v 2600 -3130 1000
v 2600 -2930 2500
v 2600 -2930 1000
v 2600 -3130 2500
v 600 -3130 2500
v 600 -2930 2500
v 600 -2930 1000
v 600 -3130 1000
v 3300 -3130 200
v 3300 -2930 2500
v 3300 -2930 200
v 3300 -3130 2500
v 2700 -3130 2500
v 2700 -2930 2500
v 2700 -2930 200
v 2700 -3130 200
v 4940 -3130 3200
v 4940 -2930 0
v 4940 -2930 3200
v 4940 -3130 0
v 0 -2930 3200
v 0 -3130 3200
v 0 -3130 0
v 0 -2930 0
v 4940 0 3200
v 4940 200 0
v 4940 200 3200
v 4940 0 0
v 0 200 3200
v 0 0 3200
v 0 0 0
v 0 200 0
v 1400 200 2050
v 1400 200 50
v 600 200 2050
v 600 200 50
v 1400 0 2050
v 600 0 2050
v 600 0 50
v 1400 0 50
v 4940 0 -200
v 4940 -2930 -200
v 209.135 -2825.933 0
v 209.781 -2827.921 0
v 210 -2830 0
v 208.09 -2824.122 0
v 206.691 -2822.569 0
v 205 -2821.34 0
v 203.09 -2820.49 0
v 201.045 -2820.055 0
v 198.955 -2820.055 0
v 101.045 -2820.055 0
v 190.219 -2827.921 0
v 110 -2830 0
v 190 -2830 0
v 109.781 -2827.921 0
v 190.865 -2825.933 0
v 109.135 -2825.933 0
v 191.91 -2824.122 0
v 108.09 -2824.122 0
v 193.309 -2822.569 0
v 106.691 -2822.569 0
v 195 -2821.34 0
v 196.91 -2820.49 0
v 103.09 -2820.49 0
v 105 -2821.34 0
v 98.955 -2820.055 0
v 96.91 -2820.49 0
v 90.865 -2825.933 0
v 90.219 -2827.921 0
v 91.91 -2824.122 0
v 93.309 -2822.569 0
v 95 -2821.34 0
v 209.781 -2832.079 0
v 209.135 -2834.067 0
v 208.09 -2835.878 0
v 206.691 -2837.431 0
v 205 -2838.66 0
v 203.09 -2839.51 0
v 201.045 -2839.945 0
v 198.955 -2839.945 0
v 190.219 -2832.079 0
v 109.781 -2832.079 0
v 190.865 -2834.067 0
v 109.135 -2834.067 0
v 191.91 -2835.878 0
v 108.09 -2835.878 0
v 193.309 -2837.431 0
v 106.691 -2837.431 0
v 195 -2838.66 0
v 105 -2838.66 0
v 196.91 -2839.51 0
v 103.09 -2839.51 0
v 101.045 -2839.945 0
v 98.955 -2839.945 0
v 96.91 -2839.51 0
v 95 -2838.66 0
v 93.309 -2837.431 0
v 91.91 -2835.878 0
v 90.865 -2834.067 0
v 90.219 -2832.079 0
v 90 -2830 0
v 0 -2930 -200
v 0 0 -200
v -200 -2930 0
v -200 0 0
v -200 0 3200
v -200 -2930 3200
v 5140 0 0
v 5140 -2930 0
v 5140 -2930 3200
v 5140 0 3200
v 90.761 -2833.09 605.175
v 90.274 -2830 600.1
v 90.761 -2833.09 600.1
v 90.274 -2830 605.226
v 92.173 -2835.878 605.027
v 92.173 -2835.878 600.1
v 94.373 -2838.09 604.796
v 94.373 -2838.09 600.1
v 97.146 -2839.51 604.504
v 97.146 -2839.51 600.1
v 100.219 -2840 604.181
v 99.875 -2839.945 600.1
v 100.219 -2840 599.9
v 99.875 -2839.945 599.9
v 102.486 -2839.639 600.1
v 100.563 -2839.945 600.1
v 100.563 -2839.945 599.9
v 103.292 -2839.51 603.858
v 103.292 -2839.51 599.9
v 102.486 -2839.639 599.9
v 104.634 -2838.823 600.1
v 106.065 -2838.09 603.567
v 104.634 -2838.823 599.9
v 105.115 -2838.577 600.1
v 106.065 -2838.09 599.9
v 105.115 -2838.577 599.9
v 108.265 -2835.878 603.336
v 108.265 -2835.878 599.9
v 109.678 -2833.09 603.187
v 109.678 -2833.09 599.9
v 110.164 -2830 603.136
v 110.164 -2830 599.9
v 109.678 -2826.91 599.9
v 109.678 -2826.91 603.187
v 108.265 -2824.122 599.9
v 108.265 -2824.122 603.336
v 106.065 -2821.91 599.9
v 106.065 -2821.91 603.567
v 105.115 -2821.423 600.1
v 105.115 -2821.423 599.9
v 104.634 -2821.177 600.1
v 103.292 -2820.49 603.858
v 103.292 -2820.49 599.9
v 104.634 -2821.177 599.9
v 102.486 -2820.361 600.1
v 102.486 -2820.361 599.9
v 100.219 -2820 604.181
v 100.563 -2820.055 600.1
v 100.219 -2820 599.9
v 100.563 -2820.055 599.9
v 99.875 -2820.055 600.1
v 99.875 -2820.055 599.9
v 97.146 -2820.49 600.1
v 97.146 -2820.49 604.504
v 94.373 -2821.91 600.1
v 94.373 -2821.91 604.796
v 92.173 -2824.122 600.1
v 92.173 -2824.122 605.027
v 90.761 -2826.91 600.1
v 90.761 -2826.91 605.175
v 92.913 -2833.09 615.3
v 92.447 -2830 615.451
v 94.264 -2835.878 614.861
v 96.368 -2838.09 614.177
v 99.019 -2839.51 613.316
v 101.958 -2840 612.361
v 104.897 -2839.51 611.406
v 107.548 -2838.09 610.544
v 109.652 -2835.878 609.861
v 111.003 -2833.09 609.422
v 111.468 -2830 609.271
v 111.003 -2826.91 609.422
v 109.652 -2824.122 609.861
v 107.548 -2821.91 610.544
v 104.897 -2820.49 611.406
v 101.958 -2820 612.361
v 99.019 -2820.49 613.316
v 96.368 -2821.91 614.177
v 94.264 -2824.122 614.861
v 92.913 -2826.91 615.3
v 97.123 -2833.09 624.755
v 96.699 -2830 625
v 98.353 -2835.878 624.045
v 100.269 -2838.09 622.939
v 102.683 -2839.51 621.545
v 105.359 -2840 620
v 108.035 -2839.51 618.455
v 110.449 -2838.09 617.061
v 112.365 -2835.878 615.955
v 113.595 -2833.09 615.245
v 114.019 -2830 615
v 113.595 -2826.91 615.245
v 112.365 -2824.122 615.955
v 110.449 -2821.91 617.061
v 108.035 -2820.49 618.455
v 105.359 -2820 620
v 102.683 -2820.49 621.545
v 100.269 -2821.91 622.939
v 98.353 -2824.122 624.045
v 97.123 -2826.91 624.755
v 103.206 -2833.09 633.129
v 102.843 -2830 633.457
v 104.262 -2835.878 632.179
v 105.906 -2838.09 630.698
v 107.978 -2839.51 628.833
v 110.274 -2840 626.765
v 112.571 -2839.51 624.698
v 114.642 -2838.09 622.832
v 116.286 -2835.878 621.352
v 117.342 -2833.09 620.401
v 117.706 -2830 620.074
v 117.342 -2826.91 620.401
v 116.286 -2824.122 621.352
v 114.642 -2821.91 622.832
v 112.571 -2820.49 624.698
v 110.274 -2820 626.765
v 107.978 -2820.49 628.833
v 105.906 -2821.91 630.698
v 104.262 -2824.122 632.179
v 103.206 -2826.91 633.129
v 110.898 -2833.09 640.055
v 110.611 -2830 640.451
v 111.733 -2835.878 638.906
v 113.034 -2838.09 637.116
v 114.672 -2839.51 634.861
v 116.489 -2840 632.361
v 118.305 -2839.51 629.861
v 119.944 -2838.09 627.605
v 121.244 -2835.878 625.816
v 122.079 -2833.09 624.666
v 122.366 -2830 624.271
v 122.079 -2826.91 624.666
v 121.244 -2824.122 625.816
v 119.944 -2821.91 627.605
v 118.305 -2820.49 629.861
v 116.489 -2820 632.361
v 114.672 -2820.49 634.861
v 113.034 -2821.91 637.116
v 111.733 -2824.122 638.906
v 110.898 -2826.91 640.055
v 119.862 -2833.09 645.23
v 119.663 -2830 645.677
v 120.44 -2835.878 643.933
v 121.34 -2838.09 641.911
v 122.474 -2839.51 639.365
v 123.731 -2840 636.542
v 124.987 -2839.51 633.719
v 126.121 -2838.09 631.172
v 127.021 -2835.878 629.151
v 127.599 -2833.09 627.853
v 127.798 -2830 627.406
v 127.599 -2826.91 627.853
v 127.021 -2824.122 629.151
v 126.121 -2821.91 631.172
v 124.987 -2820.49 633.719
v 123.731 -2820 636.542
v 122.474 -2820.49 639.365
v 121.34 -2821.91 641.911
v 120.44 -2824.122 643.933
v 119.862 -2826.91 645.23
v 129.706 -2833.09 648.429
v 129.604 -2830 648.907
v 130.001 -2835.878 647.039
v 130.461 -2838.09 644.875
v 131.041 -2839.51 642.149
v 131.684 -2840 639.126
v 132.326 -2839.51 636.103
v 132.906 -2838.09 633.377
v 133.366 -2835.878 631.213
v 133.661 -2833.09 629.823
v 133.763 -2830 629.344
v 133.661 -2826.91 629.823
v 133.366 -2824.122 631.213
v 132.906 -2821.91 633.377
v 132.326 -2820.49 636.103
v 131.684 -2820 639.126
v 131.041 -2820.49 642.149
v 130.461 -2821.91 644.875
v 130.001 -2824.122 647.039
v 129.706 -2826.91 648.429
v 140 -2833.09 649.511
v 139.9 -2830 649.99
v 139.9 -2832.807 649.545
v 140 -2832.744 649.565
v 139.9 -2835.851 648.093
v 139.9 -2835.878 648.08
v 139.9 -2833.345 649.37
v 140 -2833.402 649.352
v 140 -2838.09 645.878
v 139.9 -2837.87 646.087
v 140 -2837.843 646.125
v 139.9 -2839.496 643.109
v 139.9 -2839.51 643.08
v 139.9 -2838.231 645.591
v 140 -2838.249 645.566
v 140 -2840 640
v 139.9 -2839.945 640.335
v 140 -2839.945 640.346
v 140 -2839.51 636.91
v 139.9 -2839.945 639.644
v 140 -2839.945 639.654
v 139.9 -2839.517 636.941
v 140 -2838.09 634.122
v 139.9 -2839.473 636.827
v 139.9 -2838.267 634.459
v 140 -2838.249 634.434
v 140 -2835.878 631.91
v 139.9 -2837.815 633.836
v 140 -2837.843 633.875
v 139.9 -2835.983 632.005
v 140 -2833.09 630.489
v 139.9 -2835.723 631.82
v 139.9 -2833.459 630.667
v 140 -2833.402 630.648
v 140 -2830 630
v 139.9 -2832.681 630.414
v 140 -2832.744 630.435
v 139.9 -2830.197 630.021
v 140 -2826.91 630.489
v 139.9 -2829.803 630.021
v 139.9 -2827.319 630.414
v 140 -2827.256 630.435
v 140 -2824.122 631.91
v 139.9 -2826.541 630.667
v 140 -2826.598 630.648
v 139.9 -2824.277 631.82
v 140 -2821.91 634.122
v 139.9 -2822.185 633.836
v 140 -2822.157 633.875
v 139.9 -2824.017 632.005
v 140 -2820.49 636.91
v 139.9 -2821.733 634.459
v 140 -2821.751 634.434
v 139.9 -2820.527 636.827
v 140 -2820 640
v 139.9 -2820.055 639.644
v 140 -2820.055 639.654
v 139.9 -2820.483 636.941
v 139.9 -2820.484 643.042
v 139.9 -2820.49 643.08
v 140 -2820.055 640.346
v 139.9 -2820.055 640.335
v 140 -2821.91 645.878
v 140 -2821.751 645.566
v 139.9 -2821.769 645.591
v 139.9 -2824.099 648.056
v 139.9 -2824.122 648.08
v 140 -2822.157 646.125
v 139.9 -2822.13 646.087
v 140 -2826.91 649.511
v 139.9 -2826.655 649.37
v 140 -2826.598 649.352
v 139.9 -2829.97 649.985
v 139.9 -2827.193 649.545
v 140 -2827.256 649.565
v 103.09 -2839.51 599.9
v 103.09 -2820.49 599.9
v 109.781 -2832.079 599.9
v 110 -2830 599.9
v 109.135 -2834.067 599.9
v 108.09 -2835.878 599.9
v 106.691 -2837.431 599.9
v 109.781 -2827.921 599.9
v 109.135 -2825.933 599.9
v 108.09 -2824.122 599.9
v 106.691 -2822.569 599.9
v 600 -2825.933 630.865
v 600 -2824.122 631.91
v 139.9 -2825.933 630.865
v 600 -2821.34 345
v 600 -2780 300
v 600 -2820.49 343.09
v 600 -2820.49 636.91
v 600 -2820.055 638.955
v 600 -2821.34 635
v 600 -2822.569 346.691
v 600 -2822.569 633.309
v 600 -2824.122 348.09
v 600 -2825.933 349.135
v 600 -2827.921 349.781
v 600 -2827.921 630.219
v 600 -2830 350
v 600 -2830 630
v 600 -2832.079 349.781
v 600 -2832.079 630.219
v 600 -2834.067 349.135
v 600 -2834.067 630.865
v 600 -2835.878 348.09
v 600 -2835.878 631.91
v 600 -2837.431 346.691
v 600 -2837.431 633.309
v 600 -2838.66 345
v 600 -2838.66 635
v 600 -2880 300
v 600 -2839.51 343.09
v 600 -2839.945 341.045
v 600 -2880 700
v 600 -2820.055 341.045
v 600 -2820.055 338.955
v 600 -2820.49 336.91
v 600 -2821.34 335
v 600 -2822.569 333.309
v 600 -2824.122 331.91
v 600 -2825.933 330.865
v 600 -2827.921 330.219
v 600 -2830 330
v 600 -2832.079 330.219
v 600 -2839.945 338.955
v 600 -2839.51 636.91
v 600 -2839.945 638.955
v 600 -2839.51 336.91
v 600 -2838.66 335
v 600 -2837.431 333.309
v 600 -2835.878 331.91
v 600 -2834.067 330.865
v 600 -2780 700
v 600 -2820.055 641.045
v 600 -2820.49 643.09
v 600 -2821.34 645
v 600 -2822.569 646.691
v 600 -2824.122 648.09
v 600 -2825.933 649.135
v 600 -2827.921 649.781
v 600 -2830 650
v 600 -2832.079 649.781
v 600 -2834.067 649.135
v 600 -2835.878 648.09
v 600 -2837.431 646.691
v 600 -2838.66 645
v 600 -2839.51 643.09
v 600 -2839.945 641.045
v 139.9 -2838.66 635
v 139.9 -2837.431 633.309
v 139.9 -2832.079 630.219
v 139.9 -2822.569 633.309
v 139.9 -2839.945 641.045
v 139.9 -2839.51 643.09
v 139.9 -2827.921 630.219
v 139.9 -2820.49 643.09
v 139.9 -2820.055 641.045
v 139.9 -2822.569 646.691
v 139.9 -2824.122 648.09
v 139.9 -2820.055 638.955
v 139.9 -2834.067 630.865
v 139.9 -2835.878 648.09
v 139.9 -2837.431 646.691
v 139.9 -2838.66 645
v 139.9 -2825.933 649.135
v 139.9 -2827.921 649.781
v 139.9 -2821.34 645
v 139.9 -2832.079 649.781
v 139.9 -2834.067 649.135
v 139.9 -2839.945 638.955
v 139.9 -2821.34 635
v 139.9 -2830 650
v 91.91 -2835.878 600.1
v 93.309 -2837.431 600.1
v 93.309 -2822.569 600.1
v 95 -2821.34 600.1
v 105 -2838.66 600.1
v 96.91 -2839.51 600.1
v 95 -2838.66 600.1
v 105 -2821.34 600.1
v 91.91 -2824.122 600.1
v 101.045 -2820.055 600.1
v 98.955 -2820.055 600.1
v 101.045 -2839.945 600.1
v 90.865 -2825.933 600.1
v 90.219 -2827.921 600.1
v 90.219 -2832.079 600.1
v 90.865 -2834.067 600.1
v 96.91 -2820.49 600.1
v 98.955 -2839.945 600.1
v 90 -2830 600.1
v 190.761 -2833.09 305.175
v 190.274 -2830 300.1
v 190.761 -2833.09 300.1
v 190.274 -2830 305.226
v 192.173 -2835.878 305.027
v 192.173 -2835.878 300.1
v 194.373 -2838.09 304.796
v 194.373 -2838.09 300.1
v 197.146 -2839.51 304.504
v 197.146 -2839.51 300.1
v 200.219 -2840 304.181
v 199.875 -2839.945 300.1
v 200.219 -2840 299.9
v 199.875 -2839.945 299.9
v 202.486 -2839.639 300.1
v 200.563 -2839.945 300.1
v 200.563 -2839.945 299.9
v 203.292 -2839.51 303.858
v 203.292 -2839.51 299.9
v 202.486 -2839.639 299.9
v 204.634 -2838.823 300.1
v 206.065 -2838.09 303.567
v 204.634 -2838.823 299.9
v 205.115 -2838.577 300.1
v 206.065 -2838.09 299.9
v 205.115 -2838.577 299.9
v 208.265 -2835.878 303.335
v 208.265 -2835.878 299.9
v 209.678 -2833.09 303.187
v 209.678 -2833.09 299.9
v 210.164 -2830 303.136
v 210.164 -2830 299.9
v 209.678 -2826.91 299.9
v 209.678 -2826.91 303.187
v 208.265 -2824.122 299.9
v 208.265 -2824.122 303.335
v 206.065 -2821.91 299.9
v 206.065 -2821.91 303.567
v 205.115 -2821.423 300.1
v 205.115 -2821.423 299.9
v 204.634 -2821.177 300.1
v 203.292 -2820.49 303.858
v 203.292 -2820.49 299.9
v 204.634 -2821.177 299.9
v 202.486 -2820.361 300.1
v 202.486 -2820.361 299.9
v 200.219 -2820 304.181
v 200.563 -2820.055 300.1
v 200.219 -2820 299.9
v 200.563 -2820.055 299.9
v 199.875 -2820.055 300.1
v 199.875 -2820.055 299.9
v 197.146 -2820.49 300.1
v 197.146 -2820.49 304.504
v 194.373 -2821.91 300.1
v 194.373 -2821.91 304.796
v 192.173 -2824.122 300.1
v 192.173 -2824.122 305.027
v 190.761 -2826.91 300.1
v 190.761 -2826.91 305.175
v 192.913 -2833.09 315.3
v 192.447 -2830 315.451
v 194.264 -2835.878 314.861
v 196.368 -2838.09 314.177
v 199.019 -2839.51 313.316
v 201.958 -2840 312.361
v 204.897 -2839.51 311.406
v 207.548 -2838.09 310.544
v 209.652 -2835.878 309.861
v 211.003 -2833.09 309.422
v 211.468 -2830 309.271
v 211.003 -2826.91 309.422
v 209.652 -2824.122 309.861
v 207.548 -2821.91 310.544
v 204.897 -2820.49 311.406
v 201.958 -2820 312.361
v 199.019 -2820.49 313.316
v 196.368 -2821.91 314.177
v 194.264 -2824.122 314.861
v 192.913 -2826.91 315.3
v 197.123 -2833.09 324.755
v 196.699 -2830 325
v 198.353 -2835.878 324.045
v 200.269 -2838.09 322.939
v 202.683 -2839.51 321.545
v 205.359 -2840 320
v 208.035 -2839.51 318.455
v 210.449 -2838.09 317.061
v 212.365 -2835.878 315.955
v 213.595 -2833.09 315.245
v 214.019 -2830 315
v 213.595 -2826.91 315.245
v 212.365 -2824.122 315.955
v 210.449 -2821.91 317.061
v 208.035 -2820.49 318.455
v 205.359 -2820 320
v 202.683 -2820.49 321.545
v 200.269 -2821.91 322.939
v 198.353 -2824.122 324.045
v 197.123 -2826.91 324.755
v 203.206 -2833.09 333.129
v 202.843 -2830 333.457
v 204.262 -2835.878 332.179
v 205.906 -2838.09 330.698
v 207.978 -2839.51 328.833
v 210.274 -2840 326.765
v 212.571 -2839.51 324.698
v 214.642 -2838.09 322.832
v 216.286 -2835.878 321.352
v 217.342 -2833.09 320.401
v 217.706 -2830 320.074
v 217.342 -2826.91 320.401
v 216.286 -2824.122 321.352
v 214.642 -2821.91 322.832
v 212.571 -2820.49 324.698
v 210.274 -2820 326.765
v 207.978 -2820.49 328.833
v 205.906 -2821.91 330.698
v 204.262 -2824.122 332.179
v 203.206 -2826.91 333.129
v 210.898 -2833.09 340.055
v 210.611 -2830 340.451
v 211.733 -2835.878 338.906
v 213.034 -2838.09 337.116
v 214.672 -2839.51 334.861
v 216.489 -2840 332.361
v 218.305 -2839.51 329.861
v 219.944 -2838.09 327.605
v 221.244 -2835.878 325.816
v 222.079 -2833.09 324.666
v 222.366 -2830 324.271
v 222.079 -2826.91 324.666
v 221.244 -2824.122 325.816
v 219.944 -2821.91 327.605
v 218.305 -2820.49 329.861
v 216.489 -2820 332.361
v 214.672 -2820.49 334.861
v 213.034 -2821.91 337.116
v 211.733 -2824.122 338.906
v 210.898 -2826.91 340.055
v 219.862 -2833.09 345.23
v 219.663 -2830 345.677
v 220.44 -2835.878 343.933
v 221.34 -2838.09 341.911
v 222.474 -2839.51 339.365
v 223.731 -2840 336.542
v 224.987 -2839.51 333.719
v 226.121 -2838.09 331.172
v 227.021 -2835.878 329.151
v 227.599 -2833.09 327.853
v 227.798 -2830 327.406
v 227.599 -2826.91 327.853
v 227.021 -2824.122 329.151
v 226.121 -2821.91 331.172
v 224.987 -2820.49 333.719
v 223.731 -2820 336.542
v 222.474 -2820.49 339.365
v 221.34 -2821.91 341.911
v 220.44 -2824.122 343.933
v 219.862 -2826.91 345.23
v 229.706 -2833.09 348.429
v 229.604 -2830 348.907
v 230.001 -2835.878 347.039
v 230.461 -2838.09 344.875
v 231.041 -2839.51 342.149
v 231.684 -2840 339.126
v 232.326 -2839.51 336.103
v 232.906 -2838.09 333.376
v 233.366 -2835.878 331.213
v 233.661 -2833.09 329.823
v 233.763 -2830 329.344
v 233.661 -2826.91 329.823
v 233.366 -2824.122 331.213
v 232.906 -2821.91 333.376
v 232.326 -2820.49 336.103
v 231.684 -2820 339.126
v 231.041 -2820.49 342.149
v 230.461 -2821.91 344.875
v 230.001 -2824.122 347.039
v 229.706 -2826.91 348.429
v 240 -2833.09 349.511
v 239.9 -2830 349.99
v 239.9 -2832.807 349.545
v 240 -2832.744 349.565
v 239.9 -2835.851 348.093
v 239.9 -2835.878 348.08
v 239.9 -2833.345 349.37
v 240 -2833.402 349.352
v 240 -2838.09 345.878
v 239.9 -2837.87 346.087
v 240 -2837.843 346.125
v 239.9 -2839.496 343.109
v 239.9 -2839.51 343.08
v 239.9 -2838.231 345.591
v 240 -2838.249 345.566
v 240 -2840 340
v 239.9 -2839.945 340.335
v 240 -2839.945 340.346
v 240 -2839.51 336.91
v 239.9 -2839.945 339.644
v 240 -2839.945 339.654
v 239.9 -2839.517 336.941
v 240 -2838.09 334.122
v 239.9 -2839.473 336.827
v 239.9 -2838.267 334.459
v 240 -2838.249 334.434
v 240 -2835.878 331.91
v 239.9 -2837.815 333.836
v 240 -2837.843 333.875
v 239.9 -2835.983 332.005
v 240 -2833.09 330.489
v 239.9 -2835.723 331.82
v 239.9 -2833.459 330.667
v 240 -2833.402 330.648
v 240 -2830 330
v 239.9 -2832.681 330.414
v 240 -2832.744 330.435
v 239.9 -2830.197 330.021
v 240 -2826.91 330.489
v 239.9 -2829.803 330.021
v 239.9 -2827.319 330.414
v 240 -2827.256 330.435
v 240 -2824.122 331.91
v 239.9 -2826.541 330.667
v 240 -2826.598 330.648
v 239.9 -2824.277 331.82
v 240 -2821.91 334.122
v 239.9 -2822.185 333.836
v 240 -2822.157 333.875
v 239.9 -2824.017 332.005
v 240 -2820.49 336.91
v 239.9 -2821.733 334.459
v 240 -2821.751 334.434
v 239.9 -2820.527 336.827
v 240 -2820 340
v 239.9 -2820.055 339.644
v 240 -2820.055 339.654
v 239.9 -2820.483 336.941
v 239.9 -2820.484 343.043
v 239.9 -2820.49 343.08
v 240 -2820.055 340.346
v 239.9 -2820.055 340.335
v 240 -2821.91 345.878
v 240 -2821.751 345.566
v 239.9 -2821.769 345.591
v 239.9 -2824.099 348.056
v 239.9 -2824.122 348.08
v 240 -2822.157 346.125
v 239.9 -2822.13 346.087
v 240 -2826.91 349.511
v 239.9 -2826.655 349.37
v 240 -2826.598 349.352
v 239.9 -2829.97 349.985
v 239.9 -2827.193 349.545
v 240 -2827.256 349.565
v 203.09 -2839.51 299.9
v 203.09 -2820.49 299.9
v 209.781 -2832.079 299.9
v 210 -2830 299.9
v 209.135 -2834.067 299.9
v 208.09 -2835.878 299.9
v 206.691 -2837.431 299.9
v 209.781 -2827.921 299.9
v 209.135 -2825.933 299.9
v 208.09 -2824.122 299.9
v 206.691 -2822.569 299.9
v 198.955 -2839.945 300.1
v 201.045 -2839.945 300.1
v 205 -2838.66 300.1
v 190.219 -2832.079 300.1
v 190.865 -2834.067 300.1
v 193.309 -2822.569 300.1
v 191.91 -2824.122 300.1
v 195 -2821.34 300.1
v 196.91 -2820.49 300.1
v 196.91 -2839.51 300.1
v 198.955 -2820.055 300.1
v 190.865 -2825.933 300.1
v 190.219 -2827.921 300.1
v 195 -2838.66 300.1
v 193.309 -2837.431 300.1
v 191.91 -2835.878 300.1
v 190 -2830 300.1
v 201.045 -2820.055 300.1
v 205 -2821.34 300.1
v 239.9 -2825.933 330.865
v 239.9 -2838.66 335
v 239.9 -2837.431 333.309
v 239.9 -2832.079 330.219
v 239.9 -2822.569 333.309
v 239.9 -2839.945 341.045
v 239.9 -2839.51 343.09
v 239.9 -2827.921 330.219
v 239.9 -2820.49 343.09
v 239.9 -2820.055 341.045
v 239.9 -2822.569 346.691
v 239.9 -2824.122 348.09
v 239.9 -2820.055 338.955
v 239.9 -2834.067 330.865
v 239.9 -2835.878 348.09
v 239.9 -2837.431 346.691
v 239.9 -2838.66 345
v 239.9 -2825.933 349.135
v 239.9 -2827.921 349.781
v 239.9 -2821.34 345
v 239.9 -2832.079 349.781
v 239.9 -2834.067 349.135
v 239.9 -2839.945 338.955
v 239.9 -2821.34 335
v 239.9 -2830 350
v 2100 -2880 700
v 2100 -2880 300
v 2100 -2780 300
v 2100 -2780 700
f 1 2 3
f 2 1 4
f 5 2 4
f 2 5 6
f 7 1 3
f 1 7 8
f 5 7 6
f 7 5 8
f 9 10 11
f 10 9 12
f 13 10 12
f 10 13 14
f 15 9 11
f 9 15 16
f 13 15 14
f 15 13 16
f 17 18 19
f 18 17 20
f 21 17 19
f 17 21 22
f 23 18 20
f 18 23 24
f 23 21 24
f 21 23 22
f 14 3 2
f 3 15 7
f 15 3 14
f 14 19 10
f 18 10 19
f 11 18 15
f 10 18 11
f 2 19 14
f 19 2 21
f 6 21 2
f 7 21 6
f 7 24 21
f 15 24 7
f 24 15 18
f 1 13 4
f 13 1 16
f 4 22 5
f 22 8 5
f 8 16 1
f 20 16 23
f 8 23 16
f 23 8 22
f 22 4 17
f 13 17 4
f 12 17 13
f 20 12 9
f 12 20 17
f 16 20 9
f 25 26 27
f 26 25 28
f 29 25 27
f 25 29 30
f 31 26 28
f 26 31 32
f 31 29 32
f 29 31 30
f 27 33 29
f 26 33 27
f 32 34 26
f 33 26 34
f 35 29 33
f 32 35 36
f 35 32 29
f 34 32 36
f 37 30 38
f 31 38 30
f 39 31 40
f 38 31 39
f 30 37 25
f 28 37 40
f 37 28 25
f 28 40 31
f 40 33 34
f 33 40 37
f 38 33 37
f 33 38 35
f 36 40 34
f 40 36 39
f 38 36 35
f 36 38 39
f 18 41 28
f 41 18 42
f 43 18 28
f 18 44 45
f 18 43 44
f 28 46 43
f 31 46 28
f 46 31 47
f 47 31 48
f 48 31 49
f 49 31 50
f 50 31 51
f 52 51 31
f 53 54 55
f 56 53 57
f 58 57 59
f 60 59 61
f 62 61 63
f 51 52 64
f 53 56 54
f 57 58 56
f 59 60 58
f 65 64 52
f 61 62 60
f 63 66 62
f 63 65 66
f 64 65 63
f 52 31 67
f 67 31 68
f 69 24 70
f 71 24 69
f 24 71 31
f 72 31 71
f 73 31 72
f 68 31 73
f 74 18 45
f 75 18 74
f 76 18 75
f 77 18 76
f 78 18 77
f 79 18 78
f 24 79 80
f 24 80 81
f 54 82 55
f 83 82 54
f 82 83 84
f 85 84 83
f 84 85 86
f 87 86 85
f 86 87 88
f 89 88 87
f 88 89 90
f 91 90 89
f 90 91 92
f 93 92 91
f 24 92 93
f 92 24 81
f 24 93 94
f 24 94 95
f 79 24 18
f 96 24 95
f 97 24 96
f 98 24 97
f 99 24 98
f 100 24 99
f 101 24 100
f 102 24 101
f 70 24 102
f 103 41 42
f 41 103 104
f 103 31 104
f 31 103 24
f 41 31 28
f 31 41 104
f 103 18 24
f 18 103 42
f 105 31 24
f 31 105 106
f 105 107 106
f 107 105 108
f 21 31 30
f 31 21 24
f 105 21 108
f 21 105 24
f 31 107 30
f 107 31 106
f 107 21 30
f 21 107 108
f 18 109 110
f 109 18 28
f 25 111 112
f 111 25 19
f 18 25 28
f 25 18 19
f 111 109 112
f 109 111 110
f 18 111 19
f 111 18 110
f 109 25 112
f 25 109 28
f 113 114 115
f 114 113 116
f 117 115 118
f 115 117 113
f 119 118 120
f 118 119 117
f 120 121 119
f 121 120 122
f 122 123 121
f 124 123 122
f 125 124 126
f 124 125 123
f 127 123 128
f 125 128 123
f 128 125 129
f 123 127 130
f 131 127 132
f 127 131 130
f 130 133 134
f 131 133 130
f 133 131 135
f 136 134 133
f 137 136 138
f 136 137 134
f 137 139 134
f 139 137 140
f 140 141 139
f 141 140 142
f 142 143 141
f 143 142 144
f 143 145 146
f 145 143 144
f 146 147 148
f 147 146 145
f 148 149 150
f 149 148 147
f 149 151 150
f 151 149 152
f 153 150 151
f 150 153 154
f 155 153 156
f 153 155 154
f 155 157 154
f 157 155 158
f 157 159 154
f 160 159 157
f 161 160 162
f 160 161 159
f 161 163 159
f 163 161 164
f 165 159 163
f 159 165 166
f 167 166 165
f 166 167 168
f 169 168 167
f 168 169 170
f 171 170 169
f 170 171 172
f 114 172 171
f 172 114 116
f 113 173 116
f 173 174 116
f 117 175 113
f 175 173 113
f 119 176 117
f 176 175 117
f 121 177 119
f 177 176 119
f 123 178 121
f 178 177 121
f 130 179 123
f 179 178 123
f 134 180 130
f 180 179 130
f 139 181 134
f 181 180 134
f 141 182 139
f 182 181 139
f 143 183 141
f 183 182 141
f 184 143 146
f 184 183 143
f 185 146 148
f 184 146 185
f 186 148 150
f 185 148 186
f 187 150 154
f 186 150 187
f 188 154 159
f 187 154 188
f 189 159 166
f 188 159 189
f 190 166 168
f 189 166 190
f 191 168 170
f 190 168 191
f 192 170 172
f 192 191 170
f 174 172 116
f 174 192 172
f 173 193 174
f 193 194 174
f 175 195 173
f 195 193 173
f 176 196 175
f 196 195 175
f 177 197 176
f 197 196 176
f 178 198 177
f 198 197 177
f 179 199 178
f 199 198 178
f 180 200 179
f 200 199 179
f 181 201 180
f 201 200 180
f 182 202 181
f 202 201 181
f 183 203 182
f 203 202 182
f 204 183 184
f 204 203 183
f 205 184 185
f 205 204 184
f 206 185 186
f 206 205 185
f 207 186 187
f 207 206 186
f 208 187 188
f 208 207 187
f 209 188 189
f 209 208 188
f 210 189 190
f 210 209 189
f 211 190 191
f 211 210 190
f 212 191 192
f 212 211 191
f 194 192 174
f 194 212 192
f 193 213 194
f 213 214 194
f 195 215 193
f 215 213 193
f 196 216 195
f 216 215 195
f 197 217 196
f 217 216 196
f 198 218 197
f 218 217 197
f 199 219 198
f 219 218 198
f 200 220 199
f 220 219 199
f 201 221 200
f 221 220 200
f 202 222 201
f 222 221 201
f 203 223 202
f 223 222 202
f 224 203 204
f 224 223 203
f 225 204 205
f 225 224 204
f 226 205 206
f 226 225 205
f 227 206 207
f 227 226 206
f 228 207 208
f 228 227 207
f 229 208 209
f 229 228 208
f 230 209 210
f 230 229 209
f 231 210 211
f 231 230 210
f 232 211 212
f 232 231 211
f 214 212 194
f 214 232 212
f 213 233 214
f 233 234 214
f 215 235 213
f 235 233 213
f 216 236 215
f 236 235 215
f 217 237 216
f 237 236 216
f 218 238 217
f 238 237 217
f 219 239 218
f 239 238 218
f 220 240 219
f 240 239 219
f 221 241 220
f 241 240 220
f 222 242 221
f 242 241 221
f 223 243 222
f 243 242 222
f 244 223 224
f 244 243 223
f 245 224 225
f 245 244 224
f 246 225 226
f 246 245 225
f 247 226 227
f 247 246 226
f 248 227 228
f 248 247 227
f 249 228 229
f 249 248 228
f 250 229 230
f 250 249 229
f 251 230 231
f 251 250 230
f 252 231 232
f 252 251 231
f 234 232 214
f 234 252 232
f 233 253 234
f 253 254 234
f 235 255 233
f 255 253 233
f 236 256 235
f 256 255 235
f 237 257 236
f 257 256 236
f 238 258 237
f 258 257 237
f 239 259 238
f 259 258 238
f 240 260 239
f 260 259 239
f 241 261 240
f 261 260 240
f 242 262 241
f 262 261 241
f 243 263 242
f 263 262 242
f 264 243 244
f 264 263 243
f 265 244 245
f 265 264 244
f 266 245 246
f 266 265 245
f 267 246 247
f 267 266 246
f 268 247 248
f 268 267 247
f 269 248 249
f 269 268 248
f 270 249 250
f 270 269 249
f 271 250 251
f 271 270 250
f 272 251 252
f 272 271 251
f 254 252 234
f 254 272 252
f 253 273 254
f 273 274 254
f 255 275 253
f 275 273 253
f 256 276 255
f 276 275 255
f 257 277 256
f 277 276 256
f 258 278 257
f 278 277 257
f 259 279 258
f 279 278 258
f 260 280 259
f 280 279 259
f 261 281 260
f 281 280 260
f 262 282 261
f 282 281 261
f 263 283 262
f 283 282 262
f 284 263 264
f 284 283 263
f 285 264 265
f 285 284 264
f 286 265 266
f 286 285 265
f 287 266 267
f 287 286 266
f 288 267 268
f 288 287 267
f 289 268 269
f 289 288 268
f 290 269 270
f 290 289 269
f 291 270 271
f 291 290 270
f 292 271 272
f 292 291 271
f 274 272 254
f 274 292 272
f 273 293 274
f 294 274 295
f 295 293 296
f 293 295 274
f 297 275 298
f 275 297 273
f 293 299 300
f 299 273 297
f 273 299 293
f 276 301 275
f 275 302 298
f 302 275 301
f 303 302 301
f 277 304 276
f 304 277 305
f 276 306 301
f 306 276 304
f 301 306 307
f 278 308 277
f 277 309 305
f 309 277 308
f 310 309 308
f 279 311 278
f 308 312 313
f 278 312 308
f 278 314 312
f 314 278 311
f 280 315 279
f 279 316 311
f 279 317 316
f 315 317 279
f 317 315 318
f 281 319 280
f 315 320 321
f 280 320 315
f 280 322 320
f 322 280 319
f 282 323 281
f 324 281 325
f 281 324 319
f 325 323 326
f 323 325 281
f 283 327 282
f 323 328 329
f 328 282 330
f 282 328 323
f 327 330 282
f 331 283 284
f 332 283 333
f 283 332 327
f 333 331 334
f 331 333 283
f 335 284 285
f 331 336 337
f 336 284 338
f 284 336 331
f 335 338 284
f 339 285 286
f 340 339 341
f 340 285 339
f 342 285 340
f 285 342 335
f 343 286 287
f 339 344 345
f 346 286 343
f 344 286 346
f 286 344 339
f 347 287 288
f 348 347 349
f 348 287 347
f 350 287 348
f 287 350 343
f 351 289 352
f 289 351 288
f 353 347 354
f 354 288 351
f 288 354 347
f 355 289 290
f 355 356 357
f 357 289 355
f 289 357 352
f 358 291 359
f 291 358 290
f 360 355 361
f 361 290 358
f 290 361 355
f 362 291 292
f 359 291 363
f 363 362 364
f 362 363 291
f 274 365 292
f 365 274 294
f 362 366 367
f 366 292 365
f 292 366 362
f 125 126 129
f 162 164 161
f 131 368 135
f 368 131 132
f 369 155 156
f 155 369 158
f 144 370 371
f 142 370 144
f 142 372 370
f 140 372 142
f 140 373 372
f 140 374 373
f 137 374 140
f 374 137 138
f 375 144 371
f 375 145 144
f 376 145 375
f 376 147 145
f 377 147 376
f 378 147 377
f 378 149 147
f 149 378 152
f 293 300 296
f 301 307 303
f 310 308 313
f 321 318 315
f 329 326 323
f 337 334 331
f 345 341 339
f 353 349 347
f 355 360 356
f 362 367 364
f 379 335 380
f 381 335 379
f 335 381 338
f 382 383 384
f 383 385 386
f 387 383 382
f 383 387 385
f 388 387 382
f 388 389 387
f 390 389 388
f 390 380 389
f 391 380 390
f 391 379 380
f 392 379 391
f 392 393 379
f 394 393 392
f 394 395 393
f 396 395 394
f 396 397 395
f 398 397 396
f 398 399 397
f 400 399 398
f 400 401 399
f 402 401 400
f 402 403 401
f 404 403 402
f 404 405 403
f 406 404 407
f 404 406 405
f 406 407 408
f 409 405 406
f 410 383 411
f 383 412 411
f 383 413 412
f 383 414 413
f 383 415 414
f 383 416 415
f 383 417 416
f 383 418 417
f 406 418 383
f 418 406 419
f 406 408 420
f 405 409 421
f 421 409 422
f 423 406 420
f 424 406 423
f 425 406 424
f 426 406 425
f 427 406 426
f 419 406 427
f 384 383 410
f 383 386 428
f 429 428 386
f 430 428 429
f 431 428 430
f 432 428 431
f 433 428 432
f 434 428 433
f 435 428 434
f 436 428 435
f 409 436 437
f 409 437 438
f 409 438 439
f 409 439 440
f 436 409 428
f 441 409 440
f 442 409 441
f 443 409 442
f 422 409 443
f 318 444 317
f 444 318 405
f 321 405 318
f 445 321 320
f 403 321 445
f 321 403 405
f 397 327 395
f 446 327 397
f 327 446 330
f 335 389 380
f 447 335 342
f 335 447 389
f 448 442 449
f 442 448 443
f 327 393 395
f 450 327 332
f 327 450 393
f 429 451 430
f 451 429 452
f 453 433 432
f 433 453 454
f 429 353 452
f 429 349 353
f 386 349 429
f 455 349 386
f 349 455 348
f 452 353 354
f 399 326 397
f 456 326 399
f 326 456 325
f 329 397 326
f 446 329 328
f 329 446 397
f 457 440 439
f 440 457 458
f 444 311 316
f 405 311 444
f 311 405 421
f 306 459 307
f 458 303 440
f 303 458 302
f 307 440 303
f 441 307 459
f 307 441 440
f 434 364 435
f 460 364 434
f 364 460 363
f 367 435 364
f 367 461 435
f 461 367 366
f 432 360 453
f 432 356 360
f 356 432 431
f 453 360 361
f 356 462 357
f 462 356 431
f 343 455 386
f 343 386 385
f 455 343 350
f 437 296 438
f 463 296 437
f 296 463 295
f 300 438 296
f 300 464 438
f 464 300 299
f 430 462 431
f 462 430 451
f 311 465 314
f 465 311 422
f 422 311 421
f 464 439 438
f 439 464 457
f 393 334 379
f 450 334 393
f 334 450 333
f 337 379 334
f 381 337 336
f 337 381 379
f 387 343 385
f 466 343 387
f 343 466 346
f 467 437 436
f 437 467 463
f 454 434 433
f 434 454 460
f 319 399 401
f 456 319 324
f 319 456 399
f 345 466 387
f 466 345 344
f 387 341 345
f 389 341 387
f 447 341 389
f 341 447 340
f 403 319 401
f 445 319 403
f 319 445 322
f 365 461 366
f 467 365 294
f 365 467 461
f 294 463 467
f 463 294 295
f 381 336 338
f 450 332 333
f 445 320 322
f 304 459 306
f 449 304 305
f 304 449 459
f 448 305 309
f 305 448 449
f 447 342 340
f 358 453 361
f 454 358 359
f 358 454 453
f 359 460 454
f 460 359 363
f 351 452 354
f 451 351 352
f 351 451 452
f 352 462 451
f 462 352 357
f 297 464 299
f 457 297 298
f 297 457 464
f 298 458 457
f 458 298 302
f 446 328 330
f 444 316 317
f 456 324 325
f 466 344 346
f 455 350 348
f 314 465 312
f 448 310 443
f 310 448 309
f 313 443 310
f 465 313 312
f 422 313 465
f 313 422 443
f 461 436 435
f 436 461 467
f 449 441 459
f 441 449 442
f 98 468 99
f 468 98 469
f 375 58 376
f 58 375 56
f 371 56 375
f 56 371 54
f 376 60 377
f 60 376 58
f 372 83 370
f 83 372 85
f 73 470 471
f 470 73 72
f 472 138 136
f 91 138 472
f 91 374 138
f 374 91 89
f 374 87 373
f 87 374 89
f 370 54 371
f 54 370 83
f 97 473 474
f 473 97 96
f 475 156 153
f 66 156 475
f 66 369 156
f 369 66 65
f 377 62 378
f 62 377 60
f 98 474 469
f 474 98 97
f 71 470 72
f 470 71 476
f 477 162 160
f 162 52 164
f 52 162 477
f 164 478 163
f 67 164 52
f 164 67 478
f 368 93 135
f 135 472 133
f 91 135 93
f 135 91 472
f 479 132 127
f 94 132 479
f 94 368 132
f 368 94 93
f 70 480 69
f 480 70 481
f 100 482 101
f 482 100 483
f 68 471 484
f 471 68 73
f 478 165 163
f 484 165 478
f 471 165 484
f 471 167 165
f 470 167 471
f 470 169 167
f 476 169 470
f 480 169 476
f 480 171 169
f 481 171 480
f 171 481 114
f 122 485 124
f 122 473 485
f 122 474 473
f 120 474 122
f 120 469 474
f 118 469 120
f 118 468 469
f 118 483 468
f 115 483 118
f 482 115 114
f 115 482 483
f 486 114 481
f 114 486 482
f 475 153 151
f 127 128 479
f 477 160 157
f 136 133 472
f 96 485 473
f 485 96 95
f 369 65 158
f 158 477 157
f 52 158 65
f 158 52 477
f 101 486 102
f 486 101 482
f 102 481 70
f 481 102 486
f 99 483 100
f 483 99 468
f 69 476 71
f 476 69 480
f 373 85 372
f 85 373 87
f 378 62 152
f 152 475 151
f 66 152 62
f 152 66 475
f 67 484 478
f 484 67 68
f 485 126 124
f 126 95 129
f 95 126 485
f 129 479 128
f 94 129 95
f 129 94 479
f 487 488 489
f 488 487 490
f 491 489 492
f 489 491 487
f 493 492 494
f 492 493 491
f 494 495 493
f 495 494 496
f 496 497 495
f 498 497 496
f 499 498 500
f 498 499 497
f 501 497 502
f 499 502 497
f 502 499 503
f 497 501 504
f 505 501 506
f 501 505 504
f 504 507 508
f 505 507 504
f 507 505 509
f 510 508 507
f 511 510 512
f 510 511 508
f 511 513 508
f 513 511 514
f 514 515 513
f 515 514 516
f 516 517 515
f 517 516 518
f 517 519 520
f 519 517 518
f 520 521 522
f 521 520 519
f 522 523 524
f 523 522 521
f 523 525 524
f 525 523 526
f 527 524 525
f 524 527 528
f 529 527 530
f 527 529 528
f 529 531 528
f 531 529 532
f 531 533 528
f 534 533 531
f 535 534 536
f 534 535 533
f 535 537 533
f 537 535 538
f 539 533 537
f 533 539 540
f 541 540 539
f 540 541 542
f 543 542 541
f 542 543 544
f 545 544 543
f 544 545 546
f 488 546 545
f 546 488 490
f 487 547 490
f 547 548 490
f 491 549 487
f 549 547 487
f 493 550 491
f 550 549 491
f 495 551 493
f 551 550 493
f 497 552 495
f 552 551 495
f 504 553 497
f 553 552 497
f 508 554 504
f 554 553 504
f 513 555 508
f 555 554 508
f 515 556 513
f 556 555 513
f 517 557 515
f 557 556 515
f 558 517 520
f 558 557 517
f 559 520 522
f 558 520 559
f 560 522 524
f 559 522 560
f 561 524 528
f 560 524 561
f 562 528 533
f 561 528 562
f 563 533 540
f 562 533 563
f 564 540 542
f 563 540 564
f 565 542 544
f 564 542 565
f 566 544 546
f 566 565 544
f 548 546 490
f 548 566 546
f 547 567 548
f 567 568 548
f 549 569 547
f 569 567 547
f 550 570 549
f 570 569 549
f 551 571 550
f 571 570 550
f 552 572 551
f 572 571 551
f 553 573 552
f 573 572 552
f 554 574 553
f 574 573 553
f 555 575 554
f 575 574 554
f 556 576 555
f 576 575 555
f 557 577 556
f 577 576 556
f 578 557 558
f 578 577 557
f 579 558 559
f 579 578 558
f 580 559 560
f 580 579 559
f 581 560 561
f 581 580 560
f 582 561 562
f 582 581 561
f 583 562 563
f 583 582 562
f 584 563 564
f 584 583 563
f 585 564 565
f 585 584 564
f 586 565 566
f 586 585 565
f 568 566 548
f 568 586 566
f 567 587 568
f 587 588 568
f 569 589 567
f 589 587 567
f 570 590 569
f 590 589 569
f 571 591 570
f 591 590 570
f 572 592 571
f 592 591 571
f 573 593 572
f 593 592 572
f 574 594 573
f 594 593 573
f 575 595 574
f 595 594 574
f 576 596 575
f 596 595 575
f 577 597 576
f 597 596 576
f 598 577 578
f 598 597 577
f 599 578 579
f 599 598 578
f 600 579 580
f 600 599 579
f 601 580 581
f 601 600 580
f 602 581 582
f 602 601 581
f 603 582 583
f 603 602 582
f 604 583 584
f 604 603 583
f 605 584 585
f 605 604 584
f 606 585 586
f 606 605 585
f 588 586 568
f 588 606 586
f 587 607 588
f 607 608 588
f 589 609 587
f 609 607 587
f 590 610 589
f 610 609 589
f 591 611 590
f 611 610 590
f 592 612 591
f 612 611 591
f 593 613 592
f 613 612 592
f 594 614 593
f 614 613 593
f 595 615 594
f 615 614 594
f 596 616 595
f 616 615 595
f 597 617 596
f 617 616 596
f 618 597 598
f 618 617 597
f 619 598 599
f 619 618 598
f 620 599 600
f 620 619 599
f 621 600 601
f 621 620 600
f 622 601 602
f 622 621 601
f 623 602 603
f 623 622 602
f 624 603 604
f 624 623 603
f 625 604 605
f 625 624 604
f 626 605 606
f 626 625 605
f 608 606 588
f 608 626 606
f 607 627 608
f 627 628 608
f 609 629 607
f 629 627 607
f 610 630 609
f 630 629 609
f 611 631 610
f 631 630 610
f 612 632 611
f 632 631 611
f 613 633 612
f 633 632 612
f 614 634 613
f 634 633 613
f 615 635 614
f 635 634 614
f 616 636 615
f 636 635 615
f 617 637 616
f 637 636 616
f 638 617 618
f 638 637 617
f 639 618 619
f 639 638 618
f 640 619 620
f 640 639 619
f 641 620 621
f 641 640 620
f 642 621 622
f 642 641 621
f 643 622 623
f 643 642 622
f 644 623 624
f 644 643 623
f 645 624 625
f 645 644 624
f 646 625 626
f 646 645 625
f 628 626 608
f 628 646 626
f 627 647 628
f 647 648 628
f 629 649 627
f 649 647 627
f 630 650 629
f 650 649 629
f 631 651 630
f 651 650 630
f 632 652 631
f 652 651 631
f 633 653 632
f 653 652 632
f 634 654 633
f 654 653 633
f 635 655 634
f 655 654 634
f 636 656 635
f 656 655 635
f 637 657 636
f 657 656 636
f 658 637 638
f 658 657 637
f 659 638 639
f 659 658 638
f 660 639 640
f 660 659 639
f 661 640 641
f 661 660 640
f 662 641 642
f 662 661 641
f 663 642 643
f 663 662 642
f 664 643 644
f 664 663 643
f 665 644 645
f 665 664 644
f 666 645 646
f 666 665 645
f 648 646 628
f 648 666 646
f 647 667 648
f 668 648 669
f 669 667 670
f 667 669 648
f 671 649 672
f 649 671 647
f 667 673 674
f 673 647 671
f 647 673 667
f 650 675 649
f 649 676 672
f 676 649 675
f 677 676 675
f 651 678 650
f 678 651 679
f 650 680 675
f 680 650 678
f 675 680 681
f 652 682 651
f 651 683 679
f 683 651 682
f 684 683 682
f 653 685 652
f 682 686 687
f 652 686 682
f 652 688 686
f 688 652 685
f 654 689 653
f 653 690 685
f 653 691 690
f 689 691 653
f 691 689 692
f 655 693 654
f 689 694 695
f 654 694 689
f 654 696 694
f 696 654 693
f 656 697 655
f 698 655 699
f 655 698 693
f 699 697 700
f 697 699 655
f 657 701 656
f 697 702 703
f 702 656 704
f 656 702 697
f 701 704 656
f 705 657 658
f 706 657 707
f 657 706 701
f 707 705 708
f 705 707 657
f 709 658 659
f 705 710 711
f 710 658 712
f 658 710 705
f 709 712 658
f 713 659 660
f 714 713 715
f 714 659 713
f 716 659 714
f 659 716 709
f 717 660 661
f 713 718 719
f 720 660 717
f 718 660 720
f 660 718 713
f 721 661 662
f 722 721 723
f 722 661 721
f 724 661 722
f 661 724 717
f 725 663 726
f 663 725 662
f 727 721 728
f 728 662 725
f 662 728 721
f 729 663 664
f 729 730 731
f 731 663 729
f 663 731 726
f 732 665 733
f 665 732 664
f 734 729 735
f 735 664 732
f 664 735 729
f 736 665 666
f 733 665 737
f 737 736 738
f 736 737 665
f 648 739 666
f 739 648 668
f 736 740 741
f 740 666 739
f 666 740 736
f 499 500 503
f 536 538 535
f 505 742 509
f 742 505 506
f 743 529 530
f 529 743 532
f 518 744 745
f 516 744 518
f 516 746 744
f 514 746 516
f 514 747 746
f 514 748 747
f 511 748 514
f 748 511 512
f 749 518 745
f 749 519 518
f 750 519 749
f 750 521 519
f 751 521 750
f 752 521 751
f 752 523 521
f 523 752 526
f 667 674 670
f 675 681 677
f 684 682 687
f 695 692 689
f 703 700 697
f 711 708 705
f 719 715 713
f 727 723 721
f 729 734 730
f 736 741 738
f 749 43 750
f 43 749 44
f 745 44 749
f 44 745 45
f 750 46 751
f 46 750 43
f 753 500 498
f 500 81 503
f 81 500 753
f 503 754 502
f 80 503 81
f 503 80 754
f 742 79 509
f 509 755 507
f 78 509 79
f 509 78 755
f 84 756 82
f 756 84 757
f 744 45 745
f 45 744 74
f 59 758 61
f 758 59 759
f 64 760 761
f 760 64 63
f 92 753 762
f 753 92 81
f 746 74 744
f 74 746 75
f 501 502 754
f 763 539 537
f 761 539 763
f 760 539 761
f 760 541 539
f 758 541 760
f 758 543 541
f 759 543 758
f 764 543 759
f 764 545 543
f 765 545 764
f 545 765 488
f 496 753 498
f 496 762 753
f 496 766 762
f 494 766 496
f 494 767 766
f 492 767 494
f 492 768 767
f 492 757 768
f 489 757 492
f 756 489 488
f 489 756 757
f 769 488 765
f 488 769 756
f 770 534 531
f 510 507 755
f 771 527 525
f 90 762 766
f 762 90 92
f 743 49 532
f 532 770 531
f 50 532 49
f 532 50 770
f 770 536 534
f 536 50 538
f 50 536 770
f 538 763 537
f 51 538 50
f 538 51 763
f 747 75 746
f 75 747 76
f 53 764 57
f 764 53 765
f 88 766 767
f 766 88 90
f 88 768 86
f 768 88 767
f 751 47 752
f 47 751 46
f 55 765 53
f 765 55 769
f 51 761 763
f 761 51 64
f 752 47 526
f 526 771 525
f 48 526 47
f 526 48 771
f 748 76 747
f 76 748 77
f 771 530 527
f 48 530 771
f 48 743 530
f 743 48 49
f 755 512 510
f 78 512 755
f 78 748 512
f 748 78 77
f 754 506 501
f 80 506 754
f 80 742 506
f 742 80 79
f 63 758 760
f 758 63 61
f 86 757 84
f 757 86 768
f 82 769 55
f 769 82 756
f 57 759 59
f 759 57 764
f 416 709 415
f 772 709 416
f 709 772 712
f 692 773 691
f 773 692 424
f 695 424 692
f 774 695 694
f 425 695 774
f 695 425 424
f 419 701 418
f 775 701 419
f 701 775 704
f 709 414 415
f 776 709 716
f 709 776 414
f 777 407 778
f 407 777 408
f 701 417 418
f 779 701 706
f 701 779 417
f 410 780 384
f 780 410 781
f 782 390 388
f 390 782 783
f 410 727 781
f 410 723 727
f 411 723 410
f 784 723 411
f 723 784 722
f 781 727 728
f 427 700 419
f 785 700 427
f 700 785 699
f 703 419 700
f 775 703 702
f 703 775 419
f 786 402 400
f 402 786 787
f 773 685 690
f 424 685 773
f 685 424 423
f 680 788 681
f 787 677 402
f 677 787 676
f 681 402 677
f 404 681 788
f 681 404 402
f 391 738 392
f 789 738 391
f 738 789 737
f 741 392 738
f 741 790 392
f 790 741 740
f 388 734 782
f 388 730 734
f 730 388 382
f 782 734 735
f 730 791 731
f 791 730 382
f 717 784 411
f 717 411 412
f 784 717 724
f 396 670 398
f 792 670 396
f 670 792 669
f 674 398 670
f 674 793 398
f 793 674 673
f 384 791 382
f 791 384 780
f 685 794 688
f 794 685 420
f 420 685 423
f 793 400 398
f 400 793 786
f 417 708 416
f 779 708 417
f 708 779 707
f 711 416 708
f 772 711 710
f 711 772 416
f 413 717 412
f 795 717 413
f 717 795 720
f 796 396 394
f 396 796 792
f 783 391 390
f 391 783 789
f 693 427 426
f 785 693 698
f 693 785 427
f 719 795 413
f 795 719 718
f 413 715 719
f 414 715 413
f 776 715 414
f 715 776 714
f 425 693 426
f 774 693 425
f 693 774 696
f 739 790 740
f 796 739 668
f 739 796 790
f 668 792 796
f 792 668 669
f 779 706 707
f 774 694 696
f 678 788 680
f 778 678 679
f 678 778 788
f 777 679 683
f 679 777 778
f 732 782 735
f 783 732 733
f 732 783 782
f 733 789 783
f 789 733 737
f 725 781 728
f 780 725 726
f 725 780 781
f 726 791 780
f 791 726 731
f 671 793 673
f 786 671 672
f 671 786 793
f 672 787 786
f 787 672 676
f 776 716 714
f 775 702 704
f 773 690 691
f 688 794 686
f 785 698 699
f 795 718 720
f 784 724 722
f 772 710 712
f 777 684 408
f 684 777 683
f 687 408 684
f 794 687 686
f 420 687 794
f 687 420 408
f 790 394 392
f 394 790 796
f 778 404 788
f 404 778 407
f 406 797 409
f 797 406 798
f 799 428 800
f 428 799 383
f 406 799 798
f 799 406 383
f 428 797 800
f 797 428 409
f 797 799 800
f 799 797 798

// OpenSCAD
// file: serial_hull.scad
//serial_hull() {
//    cube(10, center=true);
//    translate([20,0,0]) sphere(10);
//    translate([30,0,0]) sphere(5);
//}


module serial_hull() {
    for(i=[0:$children-2]) {
        hull() {
            children(i);
            children(i+1);
        }
    }
}

module wedge(angle, extent=100, height=100, center=true) {
    module wedge_if(sub) {
        rotate([0,0,(angle > sub ? sub : angle)])
            translate([0,0,(center==true ? -height/2 : 0)])
                cube([extent,0.1,height]);
    }
    
    module wedge_wall() {
        for(r=[0:45:angle-1])
        rotate([0,0,r])
            translate([0,0,(center==true ? -height/2 : 0)])
                cube([extent,0.1,height]);
    }
    
    module convex_wedge(a) {
        translate([0,0,(center==true ? -height/2 : 0)])
            serial_hull() {
                for(r=[0:45:a-1])
                    rotate([0,0,r]) cube([extent,0.1,height]);
                rotate([0,0,a]) cube([extent,0.1,height]);
            }
    }
    
    if(angle<=180) {
        intersection() {
            for(i=[0:$children-1]) children(i);
            convex_wedge(angle);
        }
    } else {
        difference() {
            for(i=[0:$children-1]) children(i);
            scale([1,-1,1]) convex_wedge(360-angle);
        }
    }

//    serial_hull() {
//        wedge_if(0);
//        wedge_if(45*1);
//        wedge_if(45*2);
//        wedge_if(45*3);
//        wedge_if(45*4);
//        wedge_if(45*5);
//        wedge_if(45*6);
//        wedge_if(45*7);
//        wedge_if(45*8);
//    }
}

//difference() {
//    rotate_extrude() translate([40,0,0]) circle(r=30);
//    wedge(angle=247);
//}

wedge(angle=90)
    rotate_extrude(convexity=10) translate([40,0,0]) circle(r=30);
// file: bat.scad
// battery + pipe

use <./serial_hull.scad>

multi = 1000;

delta = 0.1;

bat_height = 0.4 * multi;
bat_length = 1.5 * multi;
bat_th = 0.1 * multi;

space_wall_bat = 0.6 * multi;
space_wall_pipe = 0.1 * multi;
space_floor_bat = 0.3 * multi;
space_pipes = 0.1 * multi;


pipe_length = 0.5 * multi;
pipe_height = space_floor_bat + 0.3 * multi;
pipe_height_low = space_floor_bat + 0.1 * multi;
pipe_d = 0.02 * multi;
pipe_2d = 2*pipe_d;



module battery() {
    translate([space_wall_bat,bat_th/2,space_floor_bat])
    rotate([90, 0, 0]) {
        color("white") cube([bat_length, bat_height, bat_th]);
    }
}

module round_pipe() {
    translate([pipe_d*2,0,0])
        rotate([0, -90, 90]) {
            wedge(angle=90, extent = pipe_d*3, height = pipe_d)
                rotate_extrude()
                    translate([pipe_2d,0,0]) circle(d=pipe_d, $fn=20);
        }
}

module pipe_top() {
    color("brown") union() {
        translate([0, 0, pipe_height]) round_pipe();
        translate([pipe_2d - delta, 0, pipe_height + pipe_2d])    
            rotate([0,90,0])
                cylinder(d=pipe_d, pipe_length - pipe_2d + delta);
        cylinder(d=pipe_d, pipe_height + delta);
    }
}

module pipe_low() {
   color("brown") union() {
        translate([space_pipes, 0, pipe_height_low - space_pipes])
            round_pipe();
        translate([space_pipes,0,0])
            cylinder(d=pipe_d, pipe_height_low + delta - space_pipes);
        translate([
            pipe_2d - delta + space_pipes,
            0,
            pipe_height_low + pipe_2d- space_pipes])    
                rotate([0,90,0])
                    cylinder(
                        d=pipe_d,
                        pipe_length - pipe_2d - space_pipes + delta);
        }
}


module create_bat() {
   union() {
        battery();
        translate([space_pipes,0,0]) {
            pipe_top();
            pipe_low();
        }
    }
}

create_bat();
// main file
use <./bat.scad>

multi = 1000; //millimeters

delta = 0.1;
delta2 = delta * 2;
delta3 = delta * 3;

room_length = 4.94 * multi;
room_width = 2.93 * multi;
room_height = 3.20 * multi;

wall_th = 0.2 * multi;

coord_floor = [room_length, room_width, wall_th];
coord_north_wall = [room_height, room_width, wall_th];

space_door_wall = 0.6 * multi;
space_balk_door_step = 0.2 * multi;
space_floor_window = 1 * multi;
space_window_balk_door = 0.1 * multi;
space_floor_door = 0.05 * multi;
space_wall_bat = 0.1 * multi;

trans_floor = [0, -room_width, -wall_th];
trans_north_wall = [0, -room_width, 0];
trans_south_wall = [room_length + wall_th, -room_width, 0];
trans_west_wall = [0, -room_width-wall_th, 0];
trans_east_wall = [0, 0, 0];
trans_door = [space_door_wall, -delta, space_floor_door];

width_door = 0.8 * multi;
width_balk_door = 0.6 * multi;
width_window = 2 * multi;

height_door = 2 * multi;
height_balk_door = 2.3 * multi;
height_window = 1.5 * multi;

function getRoomLength() = room_length;
function getRoomWidth() = room_width;
function getRoomHeight() = room_height;
function getSpaceWallBat() = space_wall_bat;
function getWallTh() = wall_th;

module room_floor() {
    translate (trans_floor) cube(coord_floor);
}

module north_wall(trans) {
    translate(trans) rotate([0, -90, 0]) cube(coord_north_wall); 
}

module west_wall(trans) {
    translate(trans) cube([room_length, wall_th, room_height]);
}

module door(trans, width, height = height_door) {
    translate(trans) cube([width, wall_th + delta2, height]);
}

module balk_door() {
    door([
         space_door_wall+width_window+space_window_balk_door,
        -room_width - wall_th - delta, space_balk_door_step
        ],
        width_balk_door, height=height_balk_door
    );
}

module window() {
    translate([space_door_wall, -room_width - wall_th - delta, space_floor_window])
        cube([width_window, wall_th + delta2, height_window]);
}

module bat() {
    translate([0,-room_width + space_wall_bat,0]) create_bat();
}

module create_room(f=true, n=true, s=true, w=true, e=true ) {
    if(f) room_floor();
    if(n) north_wall(trans_north_wall);
    if(s) north_wall(trans_south_wall);
    
    if(w) {
        difference() {
            west_wall(trans_west_wall);
            union() {
                #window();
                balk_door();
            }
        }
    }
    
    if(e) {
        difference() {
            west_wall(trans_east_wall);
            door(trans_door, width_door);
        }
    }

}

color("wheat") create_room(e=true, s=true);
bat();
